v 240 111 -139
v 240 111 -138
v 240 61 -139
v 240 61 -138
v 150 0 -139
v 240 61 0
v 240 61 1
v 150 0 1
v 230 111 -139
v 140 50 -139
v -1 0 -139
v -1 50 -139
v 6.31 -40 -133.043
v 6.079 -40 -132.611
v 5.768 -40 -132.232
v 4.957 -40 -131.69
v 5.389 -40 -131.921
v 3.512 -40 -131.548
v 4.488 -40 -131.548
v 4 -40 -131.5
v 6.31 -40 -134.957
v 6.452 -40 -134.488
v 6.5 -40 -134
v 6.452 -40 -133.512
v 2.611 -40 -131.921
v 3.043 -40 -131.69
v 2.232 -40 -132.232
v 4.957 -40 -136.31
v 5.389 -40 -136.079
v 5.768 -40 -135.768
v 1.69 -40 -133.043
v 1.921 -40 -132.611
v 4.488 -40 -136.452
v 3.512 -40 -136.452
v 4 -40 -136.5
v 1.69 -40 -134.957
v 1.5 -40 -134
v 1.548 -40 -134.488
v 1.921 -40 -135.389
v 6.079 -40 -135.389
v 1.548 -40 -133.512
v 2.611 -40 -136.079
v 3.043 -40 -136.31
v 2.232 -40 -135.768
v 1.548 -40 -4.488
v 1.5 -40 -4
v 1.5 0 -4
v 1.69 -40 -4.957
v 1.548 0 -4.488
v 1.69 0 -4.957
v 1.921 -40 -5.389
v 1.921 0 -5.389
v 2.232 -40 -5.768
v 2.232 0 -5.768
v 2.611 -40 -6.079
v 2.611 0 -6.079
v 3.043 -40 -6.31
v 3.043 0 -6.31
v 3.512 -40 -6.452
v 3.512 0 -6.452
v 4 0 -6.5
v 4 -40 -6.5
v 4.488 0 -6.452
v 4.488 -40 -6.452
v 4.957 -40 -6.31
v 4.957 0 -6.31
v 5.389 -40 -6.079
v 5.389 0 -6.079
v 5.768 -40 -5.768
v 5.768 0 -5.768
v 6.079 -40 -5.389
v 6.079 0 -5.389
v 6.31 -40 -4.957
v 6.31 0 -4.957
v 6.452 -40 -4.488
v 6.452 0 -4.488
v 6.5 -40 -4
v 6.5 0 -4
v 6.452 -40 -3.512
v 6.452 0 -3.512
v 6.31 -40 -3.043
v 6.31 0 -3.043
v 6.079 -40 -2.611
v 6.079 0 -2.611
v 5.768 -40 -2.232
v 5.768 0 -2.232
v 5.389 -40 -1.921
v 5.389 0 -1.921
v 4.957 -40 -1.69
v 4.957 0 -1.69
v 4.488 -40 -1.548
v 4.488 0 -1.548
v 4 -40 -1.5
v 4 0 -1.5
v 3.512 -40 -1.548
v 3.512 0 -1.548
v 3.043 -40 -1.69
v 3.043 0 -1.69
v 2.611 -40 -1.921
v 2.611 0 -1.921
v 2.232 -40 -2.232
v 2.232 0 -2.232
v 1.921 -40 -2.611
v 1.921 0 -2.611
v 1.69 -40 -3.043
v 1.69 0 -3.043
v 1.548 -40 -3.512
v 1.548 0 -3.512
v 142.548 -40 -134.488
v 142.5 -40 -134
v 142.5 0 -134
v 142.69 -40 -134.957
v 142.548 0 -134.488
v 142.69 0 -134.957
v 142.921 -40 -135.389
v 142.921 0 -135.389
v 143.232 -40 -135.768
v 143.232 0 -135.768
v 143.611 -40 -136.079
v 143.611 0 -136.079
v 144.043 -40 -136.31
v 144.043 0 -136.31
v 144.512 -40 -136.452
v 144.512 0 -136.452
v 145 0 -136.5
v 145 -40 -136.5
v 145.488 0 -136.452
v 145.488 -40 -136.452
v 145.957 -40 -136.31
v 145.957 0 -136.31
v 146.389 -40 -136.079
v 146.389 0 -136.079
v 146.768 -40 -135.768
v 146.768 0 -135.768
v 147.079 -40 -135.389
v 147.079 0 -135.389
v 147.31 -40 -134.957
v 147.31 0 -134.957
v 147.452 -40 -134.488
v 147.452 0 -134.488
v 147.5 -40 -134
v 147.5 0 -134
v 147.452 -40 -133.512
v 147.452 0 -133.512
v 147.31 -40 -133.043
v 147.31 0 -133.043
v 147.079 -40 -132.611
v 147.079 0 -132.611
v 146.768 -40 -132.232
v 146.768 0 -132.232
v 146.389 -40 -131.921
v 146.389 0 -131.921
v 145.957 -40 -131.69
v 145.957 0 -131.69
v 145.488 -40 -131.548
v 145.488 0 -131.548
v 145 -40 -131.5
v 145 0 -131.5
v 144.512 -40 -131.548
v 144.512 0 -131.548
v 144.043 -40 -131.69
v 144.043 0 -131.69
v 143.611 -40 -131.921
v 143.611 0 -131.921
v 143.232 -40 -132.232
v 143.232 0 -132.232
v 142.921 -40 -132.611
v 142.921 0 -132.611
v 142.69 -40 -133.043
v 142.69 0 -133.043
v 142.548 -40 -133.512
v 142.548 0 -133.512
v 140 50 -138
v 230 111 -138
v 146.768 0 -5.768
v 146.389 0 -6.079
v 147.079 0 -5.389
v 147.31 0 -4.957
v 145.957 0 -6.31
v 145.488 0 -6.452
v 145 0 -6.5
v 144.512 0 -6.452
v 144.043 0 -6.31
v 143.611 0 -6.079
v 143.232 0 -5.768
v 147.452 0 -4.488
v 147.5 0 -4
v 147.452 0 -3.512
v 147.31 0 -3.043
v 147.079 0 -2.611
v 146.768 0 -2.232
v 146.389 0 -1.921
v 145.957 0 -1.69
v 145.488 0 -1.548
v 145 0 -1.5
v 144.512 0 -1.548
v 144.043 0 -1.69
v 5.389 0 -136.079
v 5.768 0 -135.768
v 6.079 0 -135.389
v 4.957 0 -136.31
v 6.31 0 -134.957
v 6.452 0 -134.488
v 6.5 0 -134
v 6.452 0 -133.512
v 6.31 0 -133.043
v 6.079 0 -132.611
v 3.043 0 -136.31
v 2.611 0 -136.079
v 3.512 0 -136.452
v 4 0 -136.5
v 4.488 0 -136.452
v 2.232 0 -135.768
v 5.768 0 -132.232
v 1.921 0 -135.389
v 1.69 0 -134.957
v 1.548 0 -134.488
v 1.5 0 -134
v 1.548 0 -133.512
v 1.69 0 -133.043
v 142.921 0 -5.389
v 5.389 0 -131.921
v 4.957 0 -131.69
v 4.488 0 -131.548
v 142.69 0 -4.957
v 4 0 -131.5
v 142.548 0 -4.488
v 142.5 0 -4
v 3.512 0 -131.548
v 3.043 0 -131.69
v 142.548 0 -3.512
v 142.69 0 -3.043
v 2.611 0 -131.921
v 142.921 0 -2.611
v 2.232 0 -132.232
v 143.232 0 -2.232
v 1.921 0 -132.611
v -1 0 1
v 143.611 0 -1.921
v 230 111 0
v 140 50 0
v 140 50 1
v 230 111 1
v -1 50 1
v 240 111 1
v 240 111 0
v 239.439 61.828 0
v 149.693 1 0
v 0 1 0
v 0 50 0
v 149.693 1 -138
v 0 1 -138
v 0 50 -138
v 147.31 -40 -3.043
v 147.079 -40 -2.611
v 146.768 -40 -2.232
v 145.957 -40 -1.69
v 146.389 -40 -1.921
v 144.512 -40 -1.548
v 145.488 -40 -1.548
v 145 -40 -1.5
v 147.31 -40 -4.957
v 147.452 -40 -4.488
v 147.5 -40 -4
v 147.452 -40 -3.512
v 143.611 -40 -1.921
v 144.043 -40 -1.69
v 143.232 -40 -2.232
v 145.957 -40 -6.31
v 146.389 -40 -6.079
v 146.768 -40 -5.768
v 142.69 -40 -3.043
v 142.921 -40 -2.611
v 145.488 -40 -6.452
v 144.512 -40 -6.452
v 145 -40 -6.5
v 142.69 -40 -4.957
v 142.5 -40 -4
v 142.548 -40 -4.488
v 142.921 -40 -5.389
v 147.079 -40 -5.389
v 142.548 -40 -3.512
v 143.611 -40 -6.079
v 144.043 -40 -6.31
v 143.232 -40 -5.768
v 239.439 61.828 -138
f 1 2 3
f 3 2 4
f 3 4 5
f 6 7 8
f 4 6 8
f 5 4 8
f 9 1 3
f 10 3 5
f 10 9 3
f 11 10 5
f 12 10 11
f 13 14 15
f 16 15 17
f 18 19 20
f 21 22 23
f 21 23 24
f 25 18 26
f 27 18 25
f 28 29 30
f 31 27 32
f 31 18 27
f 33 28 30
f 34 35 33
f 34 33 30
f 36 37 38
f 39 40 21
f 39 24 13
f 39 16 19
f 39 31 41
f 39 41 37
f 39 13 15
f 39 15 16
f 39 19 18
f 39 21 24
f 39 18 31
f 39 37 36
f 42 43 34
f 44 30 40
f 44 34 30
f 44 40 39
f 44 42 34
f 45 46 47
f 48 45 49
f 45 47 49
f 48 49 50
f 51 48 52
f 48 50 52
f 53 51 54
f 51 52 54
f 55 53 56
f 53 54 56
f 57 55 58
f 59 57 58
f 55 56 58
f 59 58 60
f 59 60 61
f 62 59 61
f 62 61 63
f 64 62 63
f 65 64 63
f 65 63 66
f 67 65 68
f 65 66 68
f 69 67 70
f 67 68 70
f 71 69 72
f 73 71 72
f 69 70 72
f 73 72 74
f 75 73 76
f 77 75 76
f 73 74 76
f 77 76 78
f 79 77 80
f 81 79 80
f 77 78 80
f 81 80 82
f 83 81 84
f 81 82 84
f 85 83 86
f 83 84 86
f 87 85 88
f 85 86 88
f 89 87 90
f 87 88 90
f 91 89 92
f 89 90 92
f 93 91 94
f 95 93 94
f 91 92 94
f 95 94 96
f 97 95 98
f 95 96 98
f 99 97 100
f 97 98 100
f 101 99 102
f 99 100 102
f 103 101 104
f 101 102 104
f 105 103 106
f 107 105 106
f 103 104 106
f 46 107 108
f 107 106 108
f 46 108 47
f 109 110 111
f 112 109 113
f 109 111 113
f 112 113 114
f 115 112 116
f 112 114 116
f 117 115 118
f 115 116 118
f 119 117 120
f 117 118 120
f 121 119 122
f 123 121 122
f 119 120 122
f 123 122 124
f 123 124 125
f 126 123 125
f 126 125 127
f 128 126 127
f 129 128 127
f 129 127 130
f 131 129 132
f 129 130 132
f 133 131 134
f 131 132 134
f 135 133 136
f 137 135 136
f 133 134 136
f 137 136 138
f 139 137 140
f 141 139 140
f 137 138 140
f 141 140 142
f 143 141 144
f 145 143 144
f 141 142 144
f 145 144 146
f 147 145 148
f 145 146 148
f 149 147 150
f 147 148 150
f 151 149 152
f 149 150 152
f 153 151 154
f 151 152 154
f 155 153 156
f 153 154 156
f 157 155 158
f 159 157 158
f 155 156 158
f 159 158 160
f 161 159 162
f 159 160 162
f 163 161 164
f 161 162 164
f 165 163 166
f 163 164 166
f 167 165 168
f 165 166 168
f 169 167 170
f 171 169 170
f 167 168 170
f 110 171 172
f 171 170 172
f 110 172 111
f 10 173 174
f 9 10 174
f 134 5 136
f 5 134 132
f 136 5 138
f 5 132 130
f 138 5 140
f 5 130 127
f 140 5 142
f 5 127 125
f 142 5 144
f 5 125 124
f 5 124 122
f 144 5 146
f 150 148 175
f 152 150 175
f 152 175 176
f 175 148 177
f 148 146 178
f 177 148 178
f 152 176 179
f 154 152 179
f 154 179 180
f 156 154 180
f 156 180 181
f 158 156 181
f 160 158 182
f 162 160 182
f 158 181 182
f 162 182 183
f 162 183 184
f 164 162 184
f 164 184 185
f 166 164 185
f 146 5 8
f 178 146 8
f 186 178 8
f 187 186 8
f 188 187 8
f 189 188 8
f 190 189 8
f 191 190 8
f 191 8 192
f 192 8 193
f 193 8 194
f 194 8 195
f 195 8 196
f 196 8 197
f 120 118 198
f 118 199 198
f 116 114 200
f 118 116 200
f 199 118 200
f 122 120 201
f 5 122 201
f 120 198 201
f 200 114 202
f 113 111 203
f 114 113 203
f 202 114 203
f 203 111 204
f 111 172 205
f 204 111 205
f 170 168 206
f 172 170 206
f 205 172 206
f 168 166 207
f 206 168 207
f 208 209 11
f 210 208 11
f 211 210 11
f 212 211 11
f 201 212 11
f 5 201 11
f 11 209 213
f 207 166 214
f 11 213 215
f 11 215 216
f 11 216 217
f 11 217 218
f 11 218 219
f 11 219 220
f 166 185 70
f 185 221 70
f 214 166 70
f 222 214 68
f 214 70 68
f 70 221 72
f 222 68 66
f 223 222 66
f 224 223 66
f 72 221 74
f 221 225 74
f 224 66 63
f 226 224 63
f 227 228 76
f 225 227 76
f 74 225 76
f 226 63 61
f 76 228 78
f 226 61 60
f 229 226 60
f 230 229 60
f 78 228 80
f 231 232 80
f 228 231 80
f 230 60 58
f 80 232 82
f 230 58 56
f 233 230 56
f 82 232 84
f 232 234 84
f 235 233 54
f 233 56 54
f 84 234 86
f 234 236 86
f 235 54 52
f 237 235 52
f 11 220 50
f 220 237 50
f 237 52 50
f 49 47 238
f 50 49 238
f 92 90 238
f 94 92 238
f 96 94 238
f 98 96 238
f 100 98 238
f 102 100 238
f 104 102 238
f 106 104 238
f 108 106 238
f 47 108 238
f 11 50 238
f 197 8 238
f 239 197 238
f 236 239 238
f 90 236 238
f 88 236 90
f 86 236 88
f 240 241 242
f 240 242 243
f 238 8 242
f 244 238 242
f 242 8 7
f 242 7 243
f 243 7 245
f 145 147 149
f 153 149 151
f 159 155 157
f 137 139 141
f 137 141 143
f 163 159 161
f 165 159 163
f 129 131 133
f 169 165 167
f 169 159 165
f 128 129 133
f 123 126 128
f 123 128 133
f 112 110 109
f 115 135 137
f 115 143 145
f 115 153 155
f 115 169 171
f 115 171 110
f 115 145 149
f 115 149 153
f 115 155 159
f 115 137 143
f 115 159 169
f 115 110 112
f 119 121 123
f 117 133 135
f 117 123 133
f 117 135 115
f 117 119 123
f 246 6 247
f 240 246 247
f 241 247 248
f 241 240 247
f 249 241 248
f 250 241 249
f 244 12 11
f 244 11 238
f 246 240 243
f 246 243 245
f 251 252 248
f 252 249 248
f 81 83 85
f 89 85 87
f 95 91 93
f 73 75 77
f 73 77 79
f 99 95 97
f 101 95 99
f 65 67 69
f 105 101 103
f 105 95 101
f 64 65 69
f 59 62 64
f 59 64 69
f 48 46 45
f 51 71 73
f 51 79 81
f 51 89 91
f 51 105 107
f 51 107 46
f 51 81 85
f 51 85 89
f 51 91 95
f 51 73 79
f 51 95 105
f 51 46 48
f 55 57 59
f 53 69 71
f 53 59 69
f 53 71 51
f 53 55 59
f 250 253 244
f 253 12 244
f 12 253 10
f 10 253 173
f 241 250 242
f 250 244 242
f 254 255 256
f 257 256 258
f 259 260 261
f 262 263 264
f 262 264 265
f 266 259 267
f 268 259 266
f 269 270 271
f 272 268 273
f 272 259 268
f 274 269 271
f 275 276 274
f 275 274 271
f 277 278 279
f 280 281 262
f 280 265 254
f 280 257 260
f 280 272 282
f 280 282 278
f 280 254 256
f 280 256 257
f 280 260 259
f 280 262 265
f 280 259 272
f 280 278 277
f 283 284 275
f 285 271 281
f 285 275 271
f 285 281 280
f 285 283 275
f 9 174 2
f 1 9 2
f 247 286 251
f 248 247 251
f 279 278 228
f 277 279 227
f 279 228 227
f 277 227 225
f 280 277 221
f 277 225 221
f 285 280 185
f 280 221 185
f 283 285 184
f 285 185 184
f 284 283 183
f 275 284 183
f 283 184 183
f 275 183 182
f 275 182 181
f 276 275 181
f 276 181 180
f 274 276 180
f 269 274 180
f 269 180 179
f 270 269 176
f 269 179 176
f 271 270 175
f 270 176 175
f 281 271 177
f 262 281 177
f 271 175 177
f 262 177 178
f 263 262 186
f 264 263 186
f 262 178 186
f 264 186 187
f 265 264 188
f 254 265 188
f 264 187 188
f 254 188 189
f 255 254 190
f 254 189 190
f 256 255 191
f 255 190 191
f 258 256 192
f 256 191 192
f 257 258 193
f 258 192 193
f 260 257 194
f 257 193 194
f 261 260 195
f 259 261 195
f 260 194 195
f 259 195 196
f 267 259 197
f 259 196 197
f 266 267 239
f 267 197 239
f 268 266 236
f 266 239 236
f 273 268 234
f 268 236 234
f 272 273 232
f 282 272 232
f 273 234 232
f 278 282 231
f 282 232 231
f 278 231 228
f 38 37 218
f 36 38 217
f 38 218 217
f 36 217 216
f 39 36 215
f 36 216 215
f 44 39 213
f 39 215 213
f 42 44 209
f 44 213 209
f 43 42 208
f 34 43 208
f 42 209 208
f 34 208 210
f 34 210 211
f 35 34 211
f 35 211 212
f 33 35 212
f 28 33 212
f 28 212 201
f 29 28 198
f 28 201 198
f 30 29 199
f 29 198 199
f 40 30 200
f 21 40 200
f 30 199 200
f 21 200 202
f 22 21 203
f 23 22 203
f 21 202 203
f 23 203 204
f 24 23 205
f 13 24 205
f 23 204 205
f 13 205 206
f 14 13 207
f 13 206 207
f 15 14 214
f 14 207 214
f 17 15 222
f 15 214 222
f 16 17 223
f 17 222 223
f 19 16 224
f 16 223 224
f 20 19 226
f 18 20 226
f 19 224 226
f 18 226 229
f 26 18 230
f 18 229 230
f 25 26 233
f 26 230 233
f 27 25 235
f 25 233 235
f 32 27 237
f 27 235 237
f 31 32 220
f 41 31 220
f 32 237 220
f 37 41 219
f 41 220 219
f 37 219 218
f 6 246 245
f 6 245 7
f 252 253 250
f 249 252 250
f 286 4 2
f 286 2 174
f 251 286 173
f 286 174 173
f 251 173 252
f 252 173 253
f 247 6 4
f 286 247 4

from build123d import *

# Parameters (mm, degrees)
BOSS_EXTRUDE1_DEPTH = 1
SKETCH2_W           = 140
SKETCH2_H           = 50
BOSS_EXTRUDE2_DEPTH = 1
SKETCH3_W           = 151
SKETCH3_H           = 140
BOSS_EXTRUDE3_DEPTH = 1
SKETCH5_W           = 108.724422279
SKETCH5_H           = 140
BOSS_EXTRUDE4_DEPTH = 1
SKETCH6_R           = 2.5
BOSS_EXTRUDE5_DEPTH = 40


with BuildPart() as part:
    # Sketch1 → Boss-Extrude1 (new body)
    with BuildSketch(Plane.XY):
        Polygon((0, 0), (0, 50), (140, 50), (230, 111), (240, 111), (240, 61), (150, 0), align=None)
    boss_extrude1 = extrude(amount=BOSS_EXTRUDE1_DEPTH)

    # Sketch2 → Boss-Extrude2 (add)
    with BuildSketch(Plane.ZY):
        with Locations((-69, 25)):
            Rectangle(SKETCH2_W, SKETCH2_H)
    extrude(amount=BOSS_EXTRUDE2_DEPTH)

    # Mirror1: Boss-Extrude1 across plane
    add(boss_extrude1.mirror(Plane.XY.offset(-69)))

    # Sketch3 → Boss-Extrude3 (add)
    with BuildSketch(Plane.XZ):
        with Locations((74.5, -69)):
            Rectangle(SKETCH3_W, SKETCH3_H)
    extrude(amount=-BOSS_EXTRUDE3_DEPTH)

    # Sketch5 → Boss-Extrude4 (add)
    with BuildSketch(Plane(origin=(47.216817528, -69.664157009, 0), x_dir=(-0.8277808988368524, -0.5610514981005335, 0), z_dir=(0.5610514981005335, -0.8277808988368524, 0))):
        with Locations((-178.529345965, 69)):
            Rectangle(SKETCH5_W, SKETCH5_H)
    extrude(amount=-BOSS_EXTRUDE4_DEPTH)

    # Sketch6 → Boss-Extrude5 (add)
    with BuildSketch(Plane.XZ):
        with Locations(Location((4, -4, 0), (0, 0, 180))):
            Circle(SKETCH6_R)
        with Locations(Location((4, -134, 0), (0, 0, 180))):
            Circle(SKETCH6_R)
        with Locations(Location((145, -4, 0), (0, 0, 180))):
            Circle(SKETCH6_R)
        with Locations(Location((145, -134, 0), (0, 0, 180))):
            Circle(SKETCH6_R)
    extrude(amount=BOSS_EXTRUDE5_DEPTH)


solid = part.part
